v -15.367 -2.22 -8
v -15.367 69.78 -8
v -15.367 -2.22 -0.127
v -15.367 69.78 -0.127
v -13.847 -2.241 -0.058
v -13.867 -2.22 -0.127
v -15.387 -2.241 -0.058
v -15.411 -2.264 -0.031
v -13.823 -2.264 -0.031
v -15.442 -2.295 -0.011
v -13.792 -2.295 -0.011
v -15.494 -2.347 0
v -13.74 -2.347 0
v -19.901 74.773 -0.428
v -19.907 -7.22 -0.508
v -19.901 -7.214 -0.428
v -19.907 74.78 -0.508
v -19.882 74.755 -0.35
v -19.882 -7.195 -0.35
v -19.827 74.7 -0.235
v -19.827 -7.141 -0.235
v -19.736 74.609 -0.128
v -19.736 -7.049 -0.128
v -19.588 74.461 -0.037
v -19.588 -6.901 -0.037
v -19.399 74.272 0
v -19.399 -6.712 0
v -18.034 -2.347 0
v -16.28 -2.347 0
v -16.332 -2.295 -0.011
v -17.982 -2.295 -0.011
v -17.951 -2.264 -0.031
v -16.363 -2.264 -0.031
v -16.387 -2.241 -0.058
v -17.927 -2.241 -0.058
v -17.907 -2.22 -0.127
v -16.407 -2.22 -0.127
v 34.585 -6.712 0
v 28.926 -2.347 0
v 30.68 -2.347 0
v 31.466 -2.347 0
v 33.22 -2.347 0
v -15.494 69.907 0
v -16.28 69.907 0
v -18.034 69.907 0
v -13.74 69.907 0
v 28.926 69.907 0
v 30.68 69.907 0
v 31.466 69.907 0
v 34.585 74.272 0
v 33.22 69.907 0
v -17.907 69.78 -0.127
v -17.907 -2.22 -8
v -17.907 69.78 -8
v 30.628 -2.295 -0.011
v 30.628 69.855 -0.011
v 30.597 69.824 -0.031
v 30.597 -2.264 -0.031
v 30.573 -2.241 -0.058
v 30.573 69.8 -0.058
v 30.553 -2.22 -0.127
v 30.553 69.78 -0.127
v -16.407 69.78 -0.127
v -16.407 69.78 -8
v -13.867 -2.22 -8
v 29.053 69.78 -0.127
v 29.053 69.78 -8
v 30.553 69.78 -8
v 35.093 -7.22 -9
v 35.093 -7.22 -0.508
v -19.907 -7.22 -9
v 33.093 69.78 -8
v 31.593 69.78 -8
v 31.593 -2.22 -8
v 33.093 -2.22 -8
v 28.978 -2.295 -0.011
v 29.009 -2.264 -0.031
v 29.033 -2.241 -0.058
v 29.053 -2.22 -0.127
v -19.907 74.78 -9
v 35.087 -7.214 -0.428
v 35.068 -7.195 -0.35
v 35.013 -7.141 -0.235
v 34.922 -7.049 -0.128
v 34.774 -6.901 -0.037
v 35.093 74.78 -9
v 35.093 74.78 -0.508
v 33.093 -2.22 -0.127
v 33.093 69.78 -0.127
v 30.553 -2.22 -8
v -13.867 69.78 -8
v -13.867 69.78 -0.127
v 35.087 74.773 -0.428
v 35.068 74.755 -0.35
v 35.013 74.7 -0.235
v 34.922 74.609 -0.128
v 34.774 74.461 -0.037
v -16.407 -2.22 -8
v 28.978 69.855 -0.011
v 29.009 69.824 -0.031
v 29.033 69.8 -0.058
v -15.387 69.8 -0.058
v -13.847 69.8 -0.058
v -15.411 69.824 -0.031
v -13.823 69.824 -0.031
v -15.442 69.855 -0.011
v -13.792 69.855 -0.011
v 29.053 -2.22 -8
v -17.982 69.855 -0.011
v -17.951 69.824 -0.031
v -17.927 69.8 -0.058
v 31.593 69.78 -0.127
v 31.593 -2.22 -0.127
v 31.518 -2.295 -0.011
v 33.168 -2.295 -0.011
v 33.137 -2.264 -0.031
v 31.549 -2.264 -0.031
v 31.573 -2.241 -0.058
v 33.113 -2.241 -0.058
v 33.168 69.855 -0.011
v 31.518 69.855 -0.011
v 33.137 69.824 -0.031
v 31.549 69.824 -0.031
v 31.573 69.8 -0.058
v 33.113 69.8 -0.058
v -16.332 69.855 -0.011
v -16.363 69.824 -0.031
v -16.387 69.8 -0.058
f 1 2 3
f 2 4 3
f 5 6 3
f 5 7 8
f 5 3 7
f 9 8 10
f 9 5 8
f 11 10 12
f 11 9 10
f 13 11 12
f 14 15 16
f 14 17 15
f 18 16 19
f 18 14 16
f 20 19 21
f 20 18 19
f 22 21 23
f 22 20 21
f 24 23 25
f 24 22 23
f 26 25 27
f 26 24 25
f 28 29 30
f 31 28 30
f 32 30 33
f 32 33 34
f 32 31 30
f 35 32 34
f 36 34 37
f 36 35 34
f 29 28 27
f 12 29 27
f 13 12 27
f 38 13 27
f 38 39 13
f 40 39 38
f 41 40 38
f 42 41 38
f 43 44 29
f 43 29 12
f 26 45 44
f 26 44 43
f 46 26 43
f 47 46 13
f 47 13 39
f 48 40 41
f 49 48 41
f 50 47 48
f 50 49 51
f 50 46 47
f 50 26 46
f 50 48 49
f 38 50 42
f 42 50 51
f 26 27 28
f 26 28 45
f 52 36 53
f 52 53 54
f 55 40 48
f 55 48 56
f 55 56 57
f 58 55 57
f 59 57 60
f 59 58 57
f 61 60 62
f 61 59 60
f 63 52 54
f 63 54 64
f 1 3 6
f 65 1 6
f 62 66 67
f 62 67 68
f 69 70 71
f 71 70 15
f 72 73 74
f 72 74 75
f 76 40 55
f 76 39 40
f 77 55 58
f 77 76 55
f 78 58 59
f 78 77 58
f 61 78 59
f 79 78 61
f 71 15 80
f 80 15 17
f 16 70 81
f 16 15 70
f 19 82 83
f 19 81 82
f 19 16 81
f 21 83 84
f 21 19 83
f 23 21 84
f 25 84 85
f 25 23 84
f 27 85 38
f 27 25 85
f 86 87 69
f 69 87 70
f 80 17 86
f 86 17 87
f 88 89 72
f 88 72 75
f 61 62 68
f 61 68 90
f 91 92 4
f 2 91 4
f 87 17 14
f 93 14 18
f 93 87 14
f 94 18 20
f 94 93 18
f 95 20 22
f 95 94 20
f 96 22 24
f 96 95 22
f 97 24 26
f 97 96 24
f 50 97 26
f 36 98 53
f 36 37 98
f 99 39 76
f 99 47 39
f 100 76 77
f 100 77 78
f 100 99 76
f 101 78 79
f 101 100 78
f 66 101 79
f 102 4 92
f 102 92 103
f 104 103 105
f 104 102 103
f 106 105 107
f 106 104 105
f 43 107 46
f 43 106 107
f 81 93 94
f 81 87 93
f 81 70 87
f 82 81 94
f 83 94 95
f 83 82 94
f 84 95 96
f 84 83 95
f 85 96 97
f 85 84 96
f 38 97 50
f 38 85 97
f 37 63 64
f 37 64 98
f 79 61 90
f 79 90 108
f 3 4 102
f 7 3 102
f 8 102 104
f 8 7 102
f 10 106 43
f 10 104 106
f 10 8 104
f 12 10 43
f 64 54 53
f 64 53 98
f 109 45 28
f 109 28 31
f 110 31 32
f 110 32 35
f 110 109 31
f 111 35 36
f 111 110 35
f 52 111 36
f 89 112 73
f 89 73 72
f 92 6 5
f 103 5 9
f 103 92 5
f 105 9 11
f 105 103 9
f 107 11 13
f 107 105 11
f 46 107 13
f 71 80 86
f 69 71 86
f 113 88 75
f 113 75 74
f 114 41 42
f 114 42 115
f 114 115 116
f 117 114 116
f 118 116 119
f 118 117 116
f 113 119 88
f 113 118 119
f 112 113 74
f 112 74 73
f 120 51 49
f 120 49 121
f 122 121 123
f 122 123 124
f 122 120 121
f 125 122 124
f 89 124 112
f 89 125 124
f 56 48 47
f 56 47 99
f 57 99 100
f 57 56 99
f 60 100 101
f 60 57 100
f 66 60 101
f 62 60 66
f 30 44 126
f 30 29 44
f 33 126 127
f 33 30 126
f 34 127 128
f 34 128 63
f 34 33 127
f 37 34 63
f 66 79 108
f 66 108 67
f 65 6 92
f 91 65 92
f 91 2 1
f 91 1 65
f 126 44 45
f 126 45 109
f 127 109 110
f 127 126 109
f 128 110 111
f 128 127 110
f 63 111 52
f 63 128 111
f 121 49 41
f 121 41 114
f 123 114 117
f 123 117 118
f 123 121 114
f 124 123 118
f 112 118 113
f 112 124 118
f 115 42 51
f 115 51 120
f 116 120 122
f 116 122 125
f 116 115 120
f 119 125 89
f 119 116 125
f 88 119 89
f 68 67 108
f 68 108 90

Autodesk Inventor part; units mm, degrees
ref_plane "YZ Plane" through (0, 0, 0) normal (1, 0, 0) x (0, 1, 0)
ref_plane "XZ Plane" through (0, 0, 0) normal (0, 1, 0) x (-1, 0, 0)
ref_plane "XY Plane" through (0, 0, 0) normal (0, 0, 1) x (1, 0, 0)
sketch "Sketch1" plane through (0, 0, 0) normal (0, 0, 1) x (1, 0, 0)
  line L0 (35.093, -7.2202) -> (-19.907, -7.2202)
  line L1 (-19.907, -7.2202) -> (-19.907, 74.7798)
  line L2 (-19.907, 74.7798) -> (35.093, 74.7798)
  line L3 (35.093, 74.7798) -> (35.093, -7.2202)
  line L4 (-1.6316, 73.7798) -> (15.8684, 73.7798)
  line L5 (15.8684, 73.7798) -> (15.8684, 38.2798)
  line L6 (15.8684, 38.2798) -> (-1.6316, 38.2798)
  line L7 (-1.6316, 38.2798) -> (-1.6316, 73.7798)
  circle A0 centre (7.5885, 28.2798) radius 5.75
  line L8 (12.233, 6.0025) -> (3.233, 6.0025)
  line L9 (3.233, 6.0025) -> (3.233, -3.9975)
  line L10 (3.233, -3.9975) -> (12.233, -3.9975)
  line L11 (12.233, -3.9975) -> (12.233, 6.0025)
  circle A1 centre (7.5885, 28.2798) radius 1.25
  line L12 (3.233, 6.0025) -> (-2.767, 6.0025)
  line L13 (-2.767, 6.0025) -> (-2.767, -3.9975)
  line L14 (-2.767, -3.9975) -> (3.233, -3.9975)
  line L15 (3.233, -3.9975) -> (3.233, 6.0025)
  line L16 (12.233, 5.3167) -> (16.7288, 5.3167)
  line L17 (16.7288, 5.3167) -> (16.7288, 2.7767)
  line L18 (16.7288, 2.7767) -> (12.233, 2.7767)
  line L19 (12.233, 2.7767) -> (12.233, 5.3167)
  line L20 (12.233, -1.5375) -> (12.233, 1.0025)
  line L21 (12.233, -3.4895) -> (12.233, -0.9495)
  line L22 (12.233, 2.2687) -> (16.7288, 2.2687)
  line L23 (16.7288, 2.2687) -> (16.7288, -0.2713)
  line L24 (16.7288, -0.2713) -> (12.233, -0.2713)
  line L25 (12.233, -0.2713) -> (12.233, 2.2687)
  line L26 (12.233, -0.7793) -> (16.7288, -0.7793)
  line L27 (16.7288, -0.7793) -> (16.7288, -3.3193)
  line L28 (16.7288, -3.3193) -> (12.233, -3.3193)
  line L29 (12.233, -3.3193) -> (12.233, -0.7793)
  circle A2 centre (0.233, 0.9987) radius 1.5
  circle A3 centre (0.3684, 66.2798) radius 0.75
  circle A4 centre (0.3684, 63.7398) radius 0.75
  circle A5 centre (0.3684, 61.1998) radius 0.75
  circle A6 centre (0.3684, 58.6598) radius 0.75
  circle A7 centre (0.3684, 56.1198) radius 0.75
  circle A8 centre (0.3684, 53.5798) radius 0.75
  circle A9 centre (0.3684, 51.0398) radius 0.75
  circle A10 centre (0.3684, 48.4998) radius 0.75
  circle A11 centre (13.8684, 63.7398) radius 0.75
  circle A12 centre (13.8684, 58.6598) radius 0.75
  circle A13 centre (13.8684, 56.1198) radius 0.75
  circle A14 centre (13.8684, 53.5798) radius 0.75
  circle A15 centre (13.8684, 48.4998) radius 0.75
  circle A16 centre (13.8684, 66.2798) radius 0.75
  circle A17 centre (13.8684, 51.0398) radius 0.75
  circle A18 centre (13.8684, 61.1998) radius 0.75
  line L30 (-17.907, 69.7798) -> (-16.407, 69.7798)
  line L31 (-16.407, 69.7798) -> (-16.407, -2.2202)
  line L32 (-16.407, -2.2202) -> (-17.907, -2.2202)
  line L33 (-17.907, -2.2202) -> (-17.907, 69.7798)
  line L34 (-15.367, -2.2202) -> (-13.867, -2.2202)
  line L35 (-13.867, -2.2202) -> (-13.867, 69.7798)
  line L36 (-13.867, 69.7798) -> (-15.367, 69.7798)
  line L37 (-15.367, 69.7798) -> (-15.367, -2.2202)
  line L38 (31.593, 69.7798) -> (33.093, 69.7798)
  line L39 (33.093, 69.7798) -> (33.093, -2.2202)
  line L40 (33.093, -2.2202) -> (31.593, -2.2202)
  line L41 (31.593, -2.2202) -> (31.593, 69.7798)
  line L42 (30.553, -2.2202) -> (29.053, -2.2202)
  line L43 (29.053, -2.2202) -> (29.053, 69.7798)
  line L44 (29.053, 69.7798) -> (30.553, 69.7798)
  line L45 (30.553, 69.7798) -> (30.553, -2.2202)
  line L46 (5.8684, 68.7798) -> (10.8684, 68.7798)
  line L47 (10.8684, 68.7798) -> (10.8684, 63.7798)
  line L48 (10.8684, 63.7798) -> (5.8684, 63.7798)
  line L49 (5.8684, 63.7798) -> (5.8684, 68.7798)
  line L50 (6.8684, 55.8198) -> (10.8684, 55.8198)
  line L51 (10.8684, 55.8198) -> (10.8684, 53.2798)
  line L52 (10.8684, 53.2798) -> (6.8684, 53.2798)
  line L53 (6.8684, 53.2798) -> (6.8684, 55.8198)
  line L54 (5.8684, 48.2798) -> (10.8684, 48.2798)
  line L55 (10.8684, 48.2798) -> (10.8684, 43.2798)
  line L56 (10.8684, 43.2798) -> (5.8684, 43.2798)
  line L57 (5.8684, 43.2798) -> (5.8684, 48.2798)
  circle A19 centre (0.8684, 71.2798) radius 1.5
  circle A20 centre (0.8684, 40.7798) radius 1.5
  point P0 (0, 0)
  point P1 (0, 0)
  dimension "d0" = 82
  dimension "d1" = 55
  dimension "d2" = 17.5
  dimension "d3" = 35.5
  dimension "d4" = 11.5
  dimension "d5" = 2.5
  dimension "d6" = 1
  dimension "d7" = 10
  dimension "d8" = 27.4955
  dimension "d9" = 9
  dimension "d10" = 10
  dimension "d11" = 6
  dimension "d12" = 22.86
  dimension "d13" = 19.2246
  dimension "d14" = 2.54
  dimension "d15" = 0.6858
  dimension "d16" = 10
  dimension "d17" = 2.54
  dimension "d18" = 0.508
  dimension "d19" = 4.4958
  dimension "d20" = 4.4958
  dimension "d21" = 2.54
  dimension "d22" = 4.4958
  dimension "d23" = 0.508
  dimension "d24" = 3
  dimension "d25" = 1.5
  dimension "d26" = 7.5
  dimension "d27" = 2
  dimension "d28" = 1.5
  dimension "d29" = 1.5
  dimension "d30" = 1.5
  dimension "d31" = 1.5
  dimension "d32" = 1.5
  dimension "d33" = 1.5
  dimension "d34" = 1.5
  dimension "d35" = 2.54
  dimension "d36" = 2.54
  dimension "d37" = 2.54
  dimension "d38" = 2.54
  dimension "d39" = 2.54
  dimension "d40" = 2.54
  dimension "d41" = 2.54
  dimension "d42" = 1.5
  dimension "d43" = 1.5
  dimension "d44" = 1.5
  dimension "d45" = 1.5
  dimension "d46" = 1.5
  dimension "d47" = 1.5
  dimension "d48" = 1.5
  dimension "d49" = 1.5
  dimension "d50" = 2.54
  dimension "d51" = 2.54
  dimension "d52" = 2.54
  dimension "d53" = 2.54
  dimension "d54" = 2.54
  dimension "d55" = 2.54
  dimension "d56" = 2.54
  dimension "d57" = 2
  dimension "d58" = 7.5
  dimension "d59" = 2
  dimension "d60" = 2
  dimension "d61" = 2
  dimension "d62" = 2
  dimension "d63" = 2
extrude "Extrusion1" add sketch "Sketch1" against normal blind 9 contours L0 L1 L2 L3 | L4 L5 L6 L7 | A0 | L11 L10 L9 L8 | L9 L14 L13 L12 | L16 L17 L18 L11 | L22 L23 L24 L11 | L11 L26 L27 L28 | A1 | A2 | A3 | A4 | A5 | A6 | A7 | A8 | A9 | A10 | A11 | A12 | A13 | A14 | A15 | A16 | A17 | A18 | L30 L31 L32 L33 | L37 L36 L35 L34 | L38 L39 L40 L41 | L42 L43 L44 L45 | L46 L47 L48 L49 | L50 L51 L52 L53 | L54 L55 L56 L57 | A19 | A20
extrude "Extrusion2" cut sketch "Sketch1" against normal blind 8 contours L30 L31 L32 L33 | L37 L36 L35 L34 | L38 L39 L40 L41 | L42 L43 L44 L45
fillet "Fillet1" radius 0.127 16 edges at (-13.867, 33.7798, 0) (-14.617, 69.7798, 0) (-15.367, 33.7798, 0) (-16.407, 33.7798, 0) (-17.157, 69.7798, 0) (-17.907, 33.7798, 0) (-14.617, -2.2202, 0) (-17.157, -2.2202, 0) (29.803, -2.2202, 0) (32.343, -2.2202, 0) (33.093, 33.7798, 0) (31.593, 33.7798, 0) (30.553, 33.7798, 0) (29.053, 33.7798, 0) (32.343, 69.7798, 0) (29.803, 69.7798, 0)
fillet "Fillet2" radius 0.508 4 edges at (7.593, 74.7798, 0) (35.093, 33.7798, 0) (7.593, -7.2202, 0) (-19.907, 33.7798, 0)
properties part number "Breadboard"
